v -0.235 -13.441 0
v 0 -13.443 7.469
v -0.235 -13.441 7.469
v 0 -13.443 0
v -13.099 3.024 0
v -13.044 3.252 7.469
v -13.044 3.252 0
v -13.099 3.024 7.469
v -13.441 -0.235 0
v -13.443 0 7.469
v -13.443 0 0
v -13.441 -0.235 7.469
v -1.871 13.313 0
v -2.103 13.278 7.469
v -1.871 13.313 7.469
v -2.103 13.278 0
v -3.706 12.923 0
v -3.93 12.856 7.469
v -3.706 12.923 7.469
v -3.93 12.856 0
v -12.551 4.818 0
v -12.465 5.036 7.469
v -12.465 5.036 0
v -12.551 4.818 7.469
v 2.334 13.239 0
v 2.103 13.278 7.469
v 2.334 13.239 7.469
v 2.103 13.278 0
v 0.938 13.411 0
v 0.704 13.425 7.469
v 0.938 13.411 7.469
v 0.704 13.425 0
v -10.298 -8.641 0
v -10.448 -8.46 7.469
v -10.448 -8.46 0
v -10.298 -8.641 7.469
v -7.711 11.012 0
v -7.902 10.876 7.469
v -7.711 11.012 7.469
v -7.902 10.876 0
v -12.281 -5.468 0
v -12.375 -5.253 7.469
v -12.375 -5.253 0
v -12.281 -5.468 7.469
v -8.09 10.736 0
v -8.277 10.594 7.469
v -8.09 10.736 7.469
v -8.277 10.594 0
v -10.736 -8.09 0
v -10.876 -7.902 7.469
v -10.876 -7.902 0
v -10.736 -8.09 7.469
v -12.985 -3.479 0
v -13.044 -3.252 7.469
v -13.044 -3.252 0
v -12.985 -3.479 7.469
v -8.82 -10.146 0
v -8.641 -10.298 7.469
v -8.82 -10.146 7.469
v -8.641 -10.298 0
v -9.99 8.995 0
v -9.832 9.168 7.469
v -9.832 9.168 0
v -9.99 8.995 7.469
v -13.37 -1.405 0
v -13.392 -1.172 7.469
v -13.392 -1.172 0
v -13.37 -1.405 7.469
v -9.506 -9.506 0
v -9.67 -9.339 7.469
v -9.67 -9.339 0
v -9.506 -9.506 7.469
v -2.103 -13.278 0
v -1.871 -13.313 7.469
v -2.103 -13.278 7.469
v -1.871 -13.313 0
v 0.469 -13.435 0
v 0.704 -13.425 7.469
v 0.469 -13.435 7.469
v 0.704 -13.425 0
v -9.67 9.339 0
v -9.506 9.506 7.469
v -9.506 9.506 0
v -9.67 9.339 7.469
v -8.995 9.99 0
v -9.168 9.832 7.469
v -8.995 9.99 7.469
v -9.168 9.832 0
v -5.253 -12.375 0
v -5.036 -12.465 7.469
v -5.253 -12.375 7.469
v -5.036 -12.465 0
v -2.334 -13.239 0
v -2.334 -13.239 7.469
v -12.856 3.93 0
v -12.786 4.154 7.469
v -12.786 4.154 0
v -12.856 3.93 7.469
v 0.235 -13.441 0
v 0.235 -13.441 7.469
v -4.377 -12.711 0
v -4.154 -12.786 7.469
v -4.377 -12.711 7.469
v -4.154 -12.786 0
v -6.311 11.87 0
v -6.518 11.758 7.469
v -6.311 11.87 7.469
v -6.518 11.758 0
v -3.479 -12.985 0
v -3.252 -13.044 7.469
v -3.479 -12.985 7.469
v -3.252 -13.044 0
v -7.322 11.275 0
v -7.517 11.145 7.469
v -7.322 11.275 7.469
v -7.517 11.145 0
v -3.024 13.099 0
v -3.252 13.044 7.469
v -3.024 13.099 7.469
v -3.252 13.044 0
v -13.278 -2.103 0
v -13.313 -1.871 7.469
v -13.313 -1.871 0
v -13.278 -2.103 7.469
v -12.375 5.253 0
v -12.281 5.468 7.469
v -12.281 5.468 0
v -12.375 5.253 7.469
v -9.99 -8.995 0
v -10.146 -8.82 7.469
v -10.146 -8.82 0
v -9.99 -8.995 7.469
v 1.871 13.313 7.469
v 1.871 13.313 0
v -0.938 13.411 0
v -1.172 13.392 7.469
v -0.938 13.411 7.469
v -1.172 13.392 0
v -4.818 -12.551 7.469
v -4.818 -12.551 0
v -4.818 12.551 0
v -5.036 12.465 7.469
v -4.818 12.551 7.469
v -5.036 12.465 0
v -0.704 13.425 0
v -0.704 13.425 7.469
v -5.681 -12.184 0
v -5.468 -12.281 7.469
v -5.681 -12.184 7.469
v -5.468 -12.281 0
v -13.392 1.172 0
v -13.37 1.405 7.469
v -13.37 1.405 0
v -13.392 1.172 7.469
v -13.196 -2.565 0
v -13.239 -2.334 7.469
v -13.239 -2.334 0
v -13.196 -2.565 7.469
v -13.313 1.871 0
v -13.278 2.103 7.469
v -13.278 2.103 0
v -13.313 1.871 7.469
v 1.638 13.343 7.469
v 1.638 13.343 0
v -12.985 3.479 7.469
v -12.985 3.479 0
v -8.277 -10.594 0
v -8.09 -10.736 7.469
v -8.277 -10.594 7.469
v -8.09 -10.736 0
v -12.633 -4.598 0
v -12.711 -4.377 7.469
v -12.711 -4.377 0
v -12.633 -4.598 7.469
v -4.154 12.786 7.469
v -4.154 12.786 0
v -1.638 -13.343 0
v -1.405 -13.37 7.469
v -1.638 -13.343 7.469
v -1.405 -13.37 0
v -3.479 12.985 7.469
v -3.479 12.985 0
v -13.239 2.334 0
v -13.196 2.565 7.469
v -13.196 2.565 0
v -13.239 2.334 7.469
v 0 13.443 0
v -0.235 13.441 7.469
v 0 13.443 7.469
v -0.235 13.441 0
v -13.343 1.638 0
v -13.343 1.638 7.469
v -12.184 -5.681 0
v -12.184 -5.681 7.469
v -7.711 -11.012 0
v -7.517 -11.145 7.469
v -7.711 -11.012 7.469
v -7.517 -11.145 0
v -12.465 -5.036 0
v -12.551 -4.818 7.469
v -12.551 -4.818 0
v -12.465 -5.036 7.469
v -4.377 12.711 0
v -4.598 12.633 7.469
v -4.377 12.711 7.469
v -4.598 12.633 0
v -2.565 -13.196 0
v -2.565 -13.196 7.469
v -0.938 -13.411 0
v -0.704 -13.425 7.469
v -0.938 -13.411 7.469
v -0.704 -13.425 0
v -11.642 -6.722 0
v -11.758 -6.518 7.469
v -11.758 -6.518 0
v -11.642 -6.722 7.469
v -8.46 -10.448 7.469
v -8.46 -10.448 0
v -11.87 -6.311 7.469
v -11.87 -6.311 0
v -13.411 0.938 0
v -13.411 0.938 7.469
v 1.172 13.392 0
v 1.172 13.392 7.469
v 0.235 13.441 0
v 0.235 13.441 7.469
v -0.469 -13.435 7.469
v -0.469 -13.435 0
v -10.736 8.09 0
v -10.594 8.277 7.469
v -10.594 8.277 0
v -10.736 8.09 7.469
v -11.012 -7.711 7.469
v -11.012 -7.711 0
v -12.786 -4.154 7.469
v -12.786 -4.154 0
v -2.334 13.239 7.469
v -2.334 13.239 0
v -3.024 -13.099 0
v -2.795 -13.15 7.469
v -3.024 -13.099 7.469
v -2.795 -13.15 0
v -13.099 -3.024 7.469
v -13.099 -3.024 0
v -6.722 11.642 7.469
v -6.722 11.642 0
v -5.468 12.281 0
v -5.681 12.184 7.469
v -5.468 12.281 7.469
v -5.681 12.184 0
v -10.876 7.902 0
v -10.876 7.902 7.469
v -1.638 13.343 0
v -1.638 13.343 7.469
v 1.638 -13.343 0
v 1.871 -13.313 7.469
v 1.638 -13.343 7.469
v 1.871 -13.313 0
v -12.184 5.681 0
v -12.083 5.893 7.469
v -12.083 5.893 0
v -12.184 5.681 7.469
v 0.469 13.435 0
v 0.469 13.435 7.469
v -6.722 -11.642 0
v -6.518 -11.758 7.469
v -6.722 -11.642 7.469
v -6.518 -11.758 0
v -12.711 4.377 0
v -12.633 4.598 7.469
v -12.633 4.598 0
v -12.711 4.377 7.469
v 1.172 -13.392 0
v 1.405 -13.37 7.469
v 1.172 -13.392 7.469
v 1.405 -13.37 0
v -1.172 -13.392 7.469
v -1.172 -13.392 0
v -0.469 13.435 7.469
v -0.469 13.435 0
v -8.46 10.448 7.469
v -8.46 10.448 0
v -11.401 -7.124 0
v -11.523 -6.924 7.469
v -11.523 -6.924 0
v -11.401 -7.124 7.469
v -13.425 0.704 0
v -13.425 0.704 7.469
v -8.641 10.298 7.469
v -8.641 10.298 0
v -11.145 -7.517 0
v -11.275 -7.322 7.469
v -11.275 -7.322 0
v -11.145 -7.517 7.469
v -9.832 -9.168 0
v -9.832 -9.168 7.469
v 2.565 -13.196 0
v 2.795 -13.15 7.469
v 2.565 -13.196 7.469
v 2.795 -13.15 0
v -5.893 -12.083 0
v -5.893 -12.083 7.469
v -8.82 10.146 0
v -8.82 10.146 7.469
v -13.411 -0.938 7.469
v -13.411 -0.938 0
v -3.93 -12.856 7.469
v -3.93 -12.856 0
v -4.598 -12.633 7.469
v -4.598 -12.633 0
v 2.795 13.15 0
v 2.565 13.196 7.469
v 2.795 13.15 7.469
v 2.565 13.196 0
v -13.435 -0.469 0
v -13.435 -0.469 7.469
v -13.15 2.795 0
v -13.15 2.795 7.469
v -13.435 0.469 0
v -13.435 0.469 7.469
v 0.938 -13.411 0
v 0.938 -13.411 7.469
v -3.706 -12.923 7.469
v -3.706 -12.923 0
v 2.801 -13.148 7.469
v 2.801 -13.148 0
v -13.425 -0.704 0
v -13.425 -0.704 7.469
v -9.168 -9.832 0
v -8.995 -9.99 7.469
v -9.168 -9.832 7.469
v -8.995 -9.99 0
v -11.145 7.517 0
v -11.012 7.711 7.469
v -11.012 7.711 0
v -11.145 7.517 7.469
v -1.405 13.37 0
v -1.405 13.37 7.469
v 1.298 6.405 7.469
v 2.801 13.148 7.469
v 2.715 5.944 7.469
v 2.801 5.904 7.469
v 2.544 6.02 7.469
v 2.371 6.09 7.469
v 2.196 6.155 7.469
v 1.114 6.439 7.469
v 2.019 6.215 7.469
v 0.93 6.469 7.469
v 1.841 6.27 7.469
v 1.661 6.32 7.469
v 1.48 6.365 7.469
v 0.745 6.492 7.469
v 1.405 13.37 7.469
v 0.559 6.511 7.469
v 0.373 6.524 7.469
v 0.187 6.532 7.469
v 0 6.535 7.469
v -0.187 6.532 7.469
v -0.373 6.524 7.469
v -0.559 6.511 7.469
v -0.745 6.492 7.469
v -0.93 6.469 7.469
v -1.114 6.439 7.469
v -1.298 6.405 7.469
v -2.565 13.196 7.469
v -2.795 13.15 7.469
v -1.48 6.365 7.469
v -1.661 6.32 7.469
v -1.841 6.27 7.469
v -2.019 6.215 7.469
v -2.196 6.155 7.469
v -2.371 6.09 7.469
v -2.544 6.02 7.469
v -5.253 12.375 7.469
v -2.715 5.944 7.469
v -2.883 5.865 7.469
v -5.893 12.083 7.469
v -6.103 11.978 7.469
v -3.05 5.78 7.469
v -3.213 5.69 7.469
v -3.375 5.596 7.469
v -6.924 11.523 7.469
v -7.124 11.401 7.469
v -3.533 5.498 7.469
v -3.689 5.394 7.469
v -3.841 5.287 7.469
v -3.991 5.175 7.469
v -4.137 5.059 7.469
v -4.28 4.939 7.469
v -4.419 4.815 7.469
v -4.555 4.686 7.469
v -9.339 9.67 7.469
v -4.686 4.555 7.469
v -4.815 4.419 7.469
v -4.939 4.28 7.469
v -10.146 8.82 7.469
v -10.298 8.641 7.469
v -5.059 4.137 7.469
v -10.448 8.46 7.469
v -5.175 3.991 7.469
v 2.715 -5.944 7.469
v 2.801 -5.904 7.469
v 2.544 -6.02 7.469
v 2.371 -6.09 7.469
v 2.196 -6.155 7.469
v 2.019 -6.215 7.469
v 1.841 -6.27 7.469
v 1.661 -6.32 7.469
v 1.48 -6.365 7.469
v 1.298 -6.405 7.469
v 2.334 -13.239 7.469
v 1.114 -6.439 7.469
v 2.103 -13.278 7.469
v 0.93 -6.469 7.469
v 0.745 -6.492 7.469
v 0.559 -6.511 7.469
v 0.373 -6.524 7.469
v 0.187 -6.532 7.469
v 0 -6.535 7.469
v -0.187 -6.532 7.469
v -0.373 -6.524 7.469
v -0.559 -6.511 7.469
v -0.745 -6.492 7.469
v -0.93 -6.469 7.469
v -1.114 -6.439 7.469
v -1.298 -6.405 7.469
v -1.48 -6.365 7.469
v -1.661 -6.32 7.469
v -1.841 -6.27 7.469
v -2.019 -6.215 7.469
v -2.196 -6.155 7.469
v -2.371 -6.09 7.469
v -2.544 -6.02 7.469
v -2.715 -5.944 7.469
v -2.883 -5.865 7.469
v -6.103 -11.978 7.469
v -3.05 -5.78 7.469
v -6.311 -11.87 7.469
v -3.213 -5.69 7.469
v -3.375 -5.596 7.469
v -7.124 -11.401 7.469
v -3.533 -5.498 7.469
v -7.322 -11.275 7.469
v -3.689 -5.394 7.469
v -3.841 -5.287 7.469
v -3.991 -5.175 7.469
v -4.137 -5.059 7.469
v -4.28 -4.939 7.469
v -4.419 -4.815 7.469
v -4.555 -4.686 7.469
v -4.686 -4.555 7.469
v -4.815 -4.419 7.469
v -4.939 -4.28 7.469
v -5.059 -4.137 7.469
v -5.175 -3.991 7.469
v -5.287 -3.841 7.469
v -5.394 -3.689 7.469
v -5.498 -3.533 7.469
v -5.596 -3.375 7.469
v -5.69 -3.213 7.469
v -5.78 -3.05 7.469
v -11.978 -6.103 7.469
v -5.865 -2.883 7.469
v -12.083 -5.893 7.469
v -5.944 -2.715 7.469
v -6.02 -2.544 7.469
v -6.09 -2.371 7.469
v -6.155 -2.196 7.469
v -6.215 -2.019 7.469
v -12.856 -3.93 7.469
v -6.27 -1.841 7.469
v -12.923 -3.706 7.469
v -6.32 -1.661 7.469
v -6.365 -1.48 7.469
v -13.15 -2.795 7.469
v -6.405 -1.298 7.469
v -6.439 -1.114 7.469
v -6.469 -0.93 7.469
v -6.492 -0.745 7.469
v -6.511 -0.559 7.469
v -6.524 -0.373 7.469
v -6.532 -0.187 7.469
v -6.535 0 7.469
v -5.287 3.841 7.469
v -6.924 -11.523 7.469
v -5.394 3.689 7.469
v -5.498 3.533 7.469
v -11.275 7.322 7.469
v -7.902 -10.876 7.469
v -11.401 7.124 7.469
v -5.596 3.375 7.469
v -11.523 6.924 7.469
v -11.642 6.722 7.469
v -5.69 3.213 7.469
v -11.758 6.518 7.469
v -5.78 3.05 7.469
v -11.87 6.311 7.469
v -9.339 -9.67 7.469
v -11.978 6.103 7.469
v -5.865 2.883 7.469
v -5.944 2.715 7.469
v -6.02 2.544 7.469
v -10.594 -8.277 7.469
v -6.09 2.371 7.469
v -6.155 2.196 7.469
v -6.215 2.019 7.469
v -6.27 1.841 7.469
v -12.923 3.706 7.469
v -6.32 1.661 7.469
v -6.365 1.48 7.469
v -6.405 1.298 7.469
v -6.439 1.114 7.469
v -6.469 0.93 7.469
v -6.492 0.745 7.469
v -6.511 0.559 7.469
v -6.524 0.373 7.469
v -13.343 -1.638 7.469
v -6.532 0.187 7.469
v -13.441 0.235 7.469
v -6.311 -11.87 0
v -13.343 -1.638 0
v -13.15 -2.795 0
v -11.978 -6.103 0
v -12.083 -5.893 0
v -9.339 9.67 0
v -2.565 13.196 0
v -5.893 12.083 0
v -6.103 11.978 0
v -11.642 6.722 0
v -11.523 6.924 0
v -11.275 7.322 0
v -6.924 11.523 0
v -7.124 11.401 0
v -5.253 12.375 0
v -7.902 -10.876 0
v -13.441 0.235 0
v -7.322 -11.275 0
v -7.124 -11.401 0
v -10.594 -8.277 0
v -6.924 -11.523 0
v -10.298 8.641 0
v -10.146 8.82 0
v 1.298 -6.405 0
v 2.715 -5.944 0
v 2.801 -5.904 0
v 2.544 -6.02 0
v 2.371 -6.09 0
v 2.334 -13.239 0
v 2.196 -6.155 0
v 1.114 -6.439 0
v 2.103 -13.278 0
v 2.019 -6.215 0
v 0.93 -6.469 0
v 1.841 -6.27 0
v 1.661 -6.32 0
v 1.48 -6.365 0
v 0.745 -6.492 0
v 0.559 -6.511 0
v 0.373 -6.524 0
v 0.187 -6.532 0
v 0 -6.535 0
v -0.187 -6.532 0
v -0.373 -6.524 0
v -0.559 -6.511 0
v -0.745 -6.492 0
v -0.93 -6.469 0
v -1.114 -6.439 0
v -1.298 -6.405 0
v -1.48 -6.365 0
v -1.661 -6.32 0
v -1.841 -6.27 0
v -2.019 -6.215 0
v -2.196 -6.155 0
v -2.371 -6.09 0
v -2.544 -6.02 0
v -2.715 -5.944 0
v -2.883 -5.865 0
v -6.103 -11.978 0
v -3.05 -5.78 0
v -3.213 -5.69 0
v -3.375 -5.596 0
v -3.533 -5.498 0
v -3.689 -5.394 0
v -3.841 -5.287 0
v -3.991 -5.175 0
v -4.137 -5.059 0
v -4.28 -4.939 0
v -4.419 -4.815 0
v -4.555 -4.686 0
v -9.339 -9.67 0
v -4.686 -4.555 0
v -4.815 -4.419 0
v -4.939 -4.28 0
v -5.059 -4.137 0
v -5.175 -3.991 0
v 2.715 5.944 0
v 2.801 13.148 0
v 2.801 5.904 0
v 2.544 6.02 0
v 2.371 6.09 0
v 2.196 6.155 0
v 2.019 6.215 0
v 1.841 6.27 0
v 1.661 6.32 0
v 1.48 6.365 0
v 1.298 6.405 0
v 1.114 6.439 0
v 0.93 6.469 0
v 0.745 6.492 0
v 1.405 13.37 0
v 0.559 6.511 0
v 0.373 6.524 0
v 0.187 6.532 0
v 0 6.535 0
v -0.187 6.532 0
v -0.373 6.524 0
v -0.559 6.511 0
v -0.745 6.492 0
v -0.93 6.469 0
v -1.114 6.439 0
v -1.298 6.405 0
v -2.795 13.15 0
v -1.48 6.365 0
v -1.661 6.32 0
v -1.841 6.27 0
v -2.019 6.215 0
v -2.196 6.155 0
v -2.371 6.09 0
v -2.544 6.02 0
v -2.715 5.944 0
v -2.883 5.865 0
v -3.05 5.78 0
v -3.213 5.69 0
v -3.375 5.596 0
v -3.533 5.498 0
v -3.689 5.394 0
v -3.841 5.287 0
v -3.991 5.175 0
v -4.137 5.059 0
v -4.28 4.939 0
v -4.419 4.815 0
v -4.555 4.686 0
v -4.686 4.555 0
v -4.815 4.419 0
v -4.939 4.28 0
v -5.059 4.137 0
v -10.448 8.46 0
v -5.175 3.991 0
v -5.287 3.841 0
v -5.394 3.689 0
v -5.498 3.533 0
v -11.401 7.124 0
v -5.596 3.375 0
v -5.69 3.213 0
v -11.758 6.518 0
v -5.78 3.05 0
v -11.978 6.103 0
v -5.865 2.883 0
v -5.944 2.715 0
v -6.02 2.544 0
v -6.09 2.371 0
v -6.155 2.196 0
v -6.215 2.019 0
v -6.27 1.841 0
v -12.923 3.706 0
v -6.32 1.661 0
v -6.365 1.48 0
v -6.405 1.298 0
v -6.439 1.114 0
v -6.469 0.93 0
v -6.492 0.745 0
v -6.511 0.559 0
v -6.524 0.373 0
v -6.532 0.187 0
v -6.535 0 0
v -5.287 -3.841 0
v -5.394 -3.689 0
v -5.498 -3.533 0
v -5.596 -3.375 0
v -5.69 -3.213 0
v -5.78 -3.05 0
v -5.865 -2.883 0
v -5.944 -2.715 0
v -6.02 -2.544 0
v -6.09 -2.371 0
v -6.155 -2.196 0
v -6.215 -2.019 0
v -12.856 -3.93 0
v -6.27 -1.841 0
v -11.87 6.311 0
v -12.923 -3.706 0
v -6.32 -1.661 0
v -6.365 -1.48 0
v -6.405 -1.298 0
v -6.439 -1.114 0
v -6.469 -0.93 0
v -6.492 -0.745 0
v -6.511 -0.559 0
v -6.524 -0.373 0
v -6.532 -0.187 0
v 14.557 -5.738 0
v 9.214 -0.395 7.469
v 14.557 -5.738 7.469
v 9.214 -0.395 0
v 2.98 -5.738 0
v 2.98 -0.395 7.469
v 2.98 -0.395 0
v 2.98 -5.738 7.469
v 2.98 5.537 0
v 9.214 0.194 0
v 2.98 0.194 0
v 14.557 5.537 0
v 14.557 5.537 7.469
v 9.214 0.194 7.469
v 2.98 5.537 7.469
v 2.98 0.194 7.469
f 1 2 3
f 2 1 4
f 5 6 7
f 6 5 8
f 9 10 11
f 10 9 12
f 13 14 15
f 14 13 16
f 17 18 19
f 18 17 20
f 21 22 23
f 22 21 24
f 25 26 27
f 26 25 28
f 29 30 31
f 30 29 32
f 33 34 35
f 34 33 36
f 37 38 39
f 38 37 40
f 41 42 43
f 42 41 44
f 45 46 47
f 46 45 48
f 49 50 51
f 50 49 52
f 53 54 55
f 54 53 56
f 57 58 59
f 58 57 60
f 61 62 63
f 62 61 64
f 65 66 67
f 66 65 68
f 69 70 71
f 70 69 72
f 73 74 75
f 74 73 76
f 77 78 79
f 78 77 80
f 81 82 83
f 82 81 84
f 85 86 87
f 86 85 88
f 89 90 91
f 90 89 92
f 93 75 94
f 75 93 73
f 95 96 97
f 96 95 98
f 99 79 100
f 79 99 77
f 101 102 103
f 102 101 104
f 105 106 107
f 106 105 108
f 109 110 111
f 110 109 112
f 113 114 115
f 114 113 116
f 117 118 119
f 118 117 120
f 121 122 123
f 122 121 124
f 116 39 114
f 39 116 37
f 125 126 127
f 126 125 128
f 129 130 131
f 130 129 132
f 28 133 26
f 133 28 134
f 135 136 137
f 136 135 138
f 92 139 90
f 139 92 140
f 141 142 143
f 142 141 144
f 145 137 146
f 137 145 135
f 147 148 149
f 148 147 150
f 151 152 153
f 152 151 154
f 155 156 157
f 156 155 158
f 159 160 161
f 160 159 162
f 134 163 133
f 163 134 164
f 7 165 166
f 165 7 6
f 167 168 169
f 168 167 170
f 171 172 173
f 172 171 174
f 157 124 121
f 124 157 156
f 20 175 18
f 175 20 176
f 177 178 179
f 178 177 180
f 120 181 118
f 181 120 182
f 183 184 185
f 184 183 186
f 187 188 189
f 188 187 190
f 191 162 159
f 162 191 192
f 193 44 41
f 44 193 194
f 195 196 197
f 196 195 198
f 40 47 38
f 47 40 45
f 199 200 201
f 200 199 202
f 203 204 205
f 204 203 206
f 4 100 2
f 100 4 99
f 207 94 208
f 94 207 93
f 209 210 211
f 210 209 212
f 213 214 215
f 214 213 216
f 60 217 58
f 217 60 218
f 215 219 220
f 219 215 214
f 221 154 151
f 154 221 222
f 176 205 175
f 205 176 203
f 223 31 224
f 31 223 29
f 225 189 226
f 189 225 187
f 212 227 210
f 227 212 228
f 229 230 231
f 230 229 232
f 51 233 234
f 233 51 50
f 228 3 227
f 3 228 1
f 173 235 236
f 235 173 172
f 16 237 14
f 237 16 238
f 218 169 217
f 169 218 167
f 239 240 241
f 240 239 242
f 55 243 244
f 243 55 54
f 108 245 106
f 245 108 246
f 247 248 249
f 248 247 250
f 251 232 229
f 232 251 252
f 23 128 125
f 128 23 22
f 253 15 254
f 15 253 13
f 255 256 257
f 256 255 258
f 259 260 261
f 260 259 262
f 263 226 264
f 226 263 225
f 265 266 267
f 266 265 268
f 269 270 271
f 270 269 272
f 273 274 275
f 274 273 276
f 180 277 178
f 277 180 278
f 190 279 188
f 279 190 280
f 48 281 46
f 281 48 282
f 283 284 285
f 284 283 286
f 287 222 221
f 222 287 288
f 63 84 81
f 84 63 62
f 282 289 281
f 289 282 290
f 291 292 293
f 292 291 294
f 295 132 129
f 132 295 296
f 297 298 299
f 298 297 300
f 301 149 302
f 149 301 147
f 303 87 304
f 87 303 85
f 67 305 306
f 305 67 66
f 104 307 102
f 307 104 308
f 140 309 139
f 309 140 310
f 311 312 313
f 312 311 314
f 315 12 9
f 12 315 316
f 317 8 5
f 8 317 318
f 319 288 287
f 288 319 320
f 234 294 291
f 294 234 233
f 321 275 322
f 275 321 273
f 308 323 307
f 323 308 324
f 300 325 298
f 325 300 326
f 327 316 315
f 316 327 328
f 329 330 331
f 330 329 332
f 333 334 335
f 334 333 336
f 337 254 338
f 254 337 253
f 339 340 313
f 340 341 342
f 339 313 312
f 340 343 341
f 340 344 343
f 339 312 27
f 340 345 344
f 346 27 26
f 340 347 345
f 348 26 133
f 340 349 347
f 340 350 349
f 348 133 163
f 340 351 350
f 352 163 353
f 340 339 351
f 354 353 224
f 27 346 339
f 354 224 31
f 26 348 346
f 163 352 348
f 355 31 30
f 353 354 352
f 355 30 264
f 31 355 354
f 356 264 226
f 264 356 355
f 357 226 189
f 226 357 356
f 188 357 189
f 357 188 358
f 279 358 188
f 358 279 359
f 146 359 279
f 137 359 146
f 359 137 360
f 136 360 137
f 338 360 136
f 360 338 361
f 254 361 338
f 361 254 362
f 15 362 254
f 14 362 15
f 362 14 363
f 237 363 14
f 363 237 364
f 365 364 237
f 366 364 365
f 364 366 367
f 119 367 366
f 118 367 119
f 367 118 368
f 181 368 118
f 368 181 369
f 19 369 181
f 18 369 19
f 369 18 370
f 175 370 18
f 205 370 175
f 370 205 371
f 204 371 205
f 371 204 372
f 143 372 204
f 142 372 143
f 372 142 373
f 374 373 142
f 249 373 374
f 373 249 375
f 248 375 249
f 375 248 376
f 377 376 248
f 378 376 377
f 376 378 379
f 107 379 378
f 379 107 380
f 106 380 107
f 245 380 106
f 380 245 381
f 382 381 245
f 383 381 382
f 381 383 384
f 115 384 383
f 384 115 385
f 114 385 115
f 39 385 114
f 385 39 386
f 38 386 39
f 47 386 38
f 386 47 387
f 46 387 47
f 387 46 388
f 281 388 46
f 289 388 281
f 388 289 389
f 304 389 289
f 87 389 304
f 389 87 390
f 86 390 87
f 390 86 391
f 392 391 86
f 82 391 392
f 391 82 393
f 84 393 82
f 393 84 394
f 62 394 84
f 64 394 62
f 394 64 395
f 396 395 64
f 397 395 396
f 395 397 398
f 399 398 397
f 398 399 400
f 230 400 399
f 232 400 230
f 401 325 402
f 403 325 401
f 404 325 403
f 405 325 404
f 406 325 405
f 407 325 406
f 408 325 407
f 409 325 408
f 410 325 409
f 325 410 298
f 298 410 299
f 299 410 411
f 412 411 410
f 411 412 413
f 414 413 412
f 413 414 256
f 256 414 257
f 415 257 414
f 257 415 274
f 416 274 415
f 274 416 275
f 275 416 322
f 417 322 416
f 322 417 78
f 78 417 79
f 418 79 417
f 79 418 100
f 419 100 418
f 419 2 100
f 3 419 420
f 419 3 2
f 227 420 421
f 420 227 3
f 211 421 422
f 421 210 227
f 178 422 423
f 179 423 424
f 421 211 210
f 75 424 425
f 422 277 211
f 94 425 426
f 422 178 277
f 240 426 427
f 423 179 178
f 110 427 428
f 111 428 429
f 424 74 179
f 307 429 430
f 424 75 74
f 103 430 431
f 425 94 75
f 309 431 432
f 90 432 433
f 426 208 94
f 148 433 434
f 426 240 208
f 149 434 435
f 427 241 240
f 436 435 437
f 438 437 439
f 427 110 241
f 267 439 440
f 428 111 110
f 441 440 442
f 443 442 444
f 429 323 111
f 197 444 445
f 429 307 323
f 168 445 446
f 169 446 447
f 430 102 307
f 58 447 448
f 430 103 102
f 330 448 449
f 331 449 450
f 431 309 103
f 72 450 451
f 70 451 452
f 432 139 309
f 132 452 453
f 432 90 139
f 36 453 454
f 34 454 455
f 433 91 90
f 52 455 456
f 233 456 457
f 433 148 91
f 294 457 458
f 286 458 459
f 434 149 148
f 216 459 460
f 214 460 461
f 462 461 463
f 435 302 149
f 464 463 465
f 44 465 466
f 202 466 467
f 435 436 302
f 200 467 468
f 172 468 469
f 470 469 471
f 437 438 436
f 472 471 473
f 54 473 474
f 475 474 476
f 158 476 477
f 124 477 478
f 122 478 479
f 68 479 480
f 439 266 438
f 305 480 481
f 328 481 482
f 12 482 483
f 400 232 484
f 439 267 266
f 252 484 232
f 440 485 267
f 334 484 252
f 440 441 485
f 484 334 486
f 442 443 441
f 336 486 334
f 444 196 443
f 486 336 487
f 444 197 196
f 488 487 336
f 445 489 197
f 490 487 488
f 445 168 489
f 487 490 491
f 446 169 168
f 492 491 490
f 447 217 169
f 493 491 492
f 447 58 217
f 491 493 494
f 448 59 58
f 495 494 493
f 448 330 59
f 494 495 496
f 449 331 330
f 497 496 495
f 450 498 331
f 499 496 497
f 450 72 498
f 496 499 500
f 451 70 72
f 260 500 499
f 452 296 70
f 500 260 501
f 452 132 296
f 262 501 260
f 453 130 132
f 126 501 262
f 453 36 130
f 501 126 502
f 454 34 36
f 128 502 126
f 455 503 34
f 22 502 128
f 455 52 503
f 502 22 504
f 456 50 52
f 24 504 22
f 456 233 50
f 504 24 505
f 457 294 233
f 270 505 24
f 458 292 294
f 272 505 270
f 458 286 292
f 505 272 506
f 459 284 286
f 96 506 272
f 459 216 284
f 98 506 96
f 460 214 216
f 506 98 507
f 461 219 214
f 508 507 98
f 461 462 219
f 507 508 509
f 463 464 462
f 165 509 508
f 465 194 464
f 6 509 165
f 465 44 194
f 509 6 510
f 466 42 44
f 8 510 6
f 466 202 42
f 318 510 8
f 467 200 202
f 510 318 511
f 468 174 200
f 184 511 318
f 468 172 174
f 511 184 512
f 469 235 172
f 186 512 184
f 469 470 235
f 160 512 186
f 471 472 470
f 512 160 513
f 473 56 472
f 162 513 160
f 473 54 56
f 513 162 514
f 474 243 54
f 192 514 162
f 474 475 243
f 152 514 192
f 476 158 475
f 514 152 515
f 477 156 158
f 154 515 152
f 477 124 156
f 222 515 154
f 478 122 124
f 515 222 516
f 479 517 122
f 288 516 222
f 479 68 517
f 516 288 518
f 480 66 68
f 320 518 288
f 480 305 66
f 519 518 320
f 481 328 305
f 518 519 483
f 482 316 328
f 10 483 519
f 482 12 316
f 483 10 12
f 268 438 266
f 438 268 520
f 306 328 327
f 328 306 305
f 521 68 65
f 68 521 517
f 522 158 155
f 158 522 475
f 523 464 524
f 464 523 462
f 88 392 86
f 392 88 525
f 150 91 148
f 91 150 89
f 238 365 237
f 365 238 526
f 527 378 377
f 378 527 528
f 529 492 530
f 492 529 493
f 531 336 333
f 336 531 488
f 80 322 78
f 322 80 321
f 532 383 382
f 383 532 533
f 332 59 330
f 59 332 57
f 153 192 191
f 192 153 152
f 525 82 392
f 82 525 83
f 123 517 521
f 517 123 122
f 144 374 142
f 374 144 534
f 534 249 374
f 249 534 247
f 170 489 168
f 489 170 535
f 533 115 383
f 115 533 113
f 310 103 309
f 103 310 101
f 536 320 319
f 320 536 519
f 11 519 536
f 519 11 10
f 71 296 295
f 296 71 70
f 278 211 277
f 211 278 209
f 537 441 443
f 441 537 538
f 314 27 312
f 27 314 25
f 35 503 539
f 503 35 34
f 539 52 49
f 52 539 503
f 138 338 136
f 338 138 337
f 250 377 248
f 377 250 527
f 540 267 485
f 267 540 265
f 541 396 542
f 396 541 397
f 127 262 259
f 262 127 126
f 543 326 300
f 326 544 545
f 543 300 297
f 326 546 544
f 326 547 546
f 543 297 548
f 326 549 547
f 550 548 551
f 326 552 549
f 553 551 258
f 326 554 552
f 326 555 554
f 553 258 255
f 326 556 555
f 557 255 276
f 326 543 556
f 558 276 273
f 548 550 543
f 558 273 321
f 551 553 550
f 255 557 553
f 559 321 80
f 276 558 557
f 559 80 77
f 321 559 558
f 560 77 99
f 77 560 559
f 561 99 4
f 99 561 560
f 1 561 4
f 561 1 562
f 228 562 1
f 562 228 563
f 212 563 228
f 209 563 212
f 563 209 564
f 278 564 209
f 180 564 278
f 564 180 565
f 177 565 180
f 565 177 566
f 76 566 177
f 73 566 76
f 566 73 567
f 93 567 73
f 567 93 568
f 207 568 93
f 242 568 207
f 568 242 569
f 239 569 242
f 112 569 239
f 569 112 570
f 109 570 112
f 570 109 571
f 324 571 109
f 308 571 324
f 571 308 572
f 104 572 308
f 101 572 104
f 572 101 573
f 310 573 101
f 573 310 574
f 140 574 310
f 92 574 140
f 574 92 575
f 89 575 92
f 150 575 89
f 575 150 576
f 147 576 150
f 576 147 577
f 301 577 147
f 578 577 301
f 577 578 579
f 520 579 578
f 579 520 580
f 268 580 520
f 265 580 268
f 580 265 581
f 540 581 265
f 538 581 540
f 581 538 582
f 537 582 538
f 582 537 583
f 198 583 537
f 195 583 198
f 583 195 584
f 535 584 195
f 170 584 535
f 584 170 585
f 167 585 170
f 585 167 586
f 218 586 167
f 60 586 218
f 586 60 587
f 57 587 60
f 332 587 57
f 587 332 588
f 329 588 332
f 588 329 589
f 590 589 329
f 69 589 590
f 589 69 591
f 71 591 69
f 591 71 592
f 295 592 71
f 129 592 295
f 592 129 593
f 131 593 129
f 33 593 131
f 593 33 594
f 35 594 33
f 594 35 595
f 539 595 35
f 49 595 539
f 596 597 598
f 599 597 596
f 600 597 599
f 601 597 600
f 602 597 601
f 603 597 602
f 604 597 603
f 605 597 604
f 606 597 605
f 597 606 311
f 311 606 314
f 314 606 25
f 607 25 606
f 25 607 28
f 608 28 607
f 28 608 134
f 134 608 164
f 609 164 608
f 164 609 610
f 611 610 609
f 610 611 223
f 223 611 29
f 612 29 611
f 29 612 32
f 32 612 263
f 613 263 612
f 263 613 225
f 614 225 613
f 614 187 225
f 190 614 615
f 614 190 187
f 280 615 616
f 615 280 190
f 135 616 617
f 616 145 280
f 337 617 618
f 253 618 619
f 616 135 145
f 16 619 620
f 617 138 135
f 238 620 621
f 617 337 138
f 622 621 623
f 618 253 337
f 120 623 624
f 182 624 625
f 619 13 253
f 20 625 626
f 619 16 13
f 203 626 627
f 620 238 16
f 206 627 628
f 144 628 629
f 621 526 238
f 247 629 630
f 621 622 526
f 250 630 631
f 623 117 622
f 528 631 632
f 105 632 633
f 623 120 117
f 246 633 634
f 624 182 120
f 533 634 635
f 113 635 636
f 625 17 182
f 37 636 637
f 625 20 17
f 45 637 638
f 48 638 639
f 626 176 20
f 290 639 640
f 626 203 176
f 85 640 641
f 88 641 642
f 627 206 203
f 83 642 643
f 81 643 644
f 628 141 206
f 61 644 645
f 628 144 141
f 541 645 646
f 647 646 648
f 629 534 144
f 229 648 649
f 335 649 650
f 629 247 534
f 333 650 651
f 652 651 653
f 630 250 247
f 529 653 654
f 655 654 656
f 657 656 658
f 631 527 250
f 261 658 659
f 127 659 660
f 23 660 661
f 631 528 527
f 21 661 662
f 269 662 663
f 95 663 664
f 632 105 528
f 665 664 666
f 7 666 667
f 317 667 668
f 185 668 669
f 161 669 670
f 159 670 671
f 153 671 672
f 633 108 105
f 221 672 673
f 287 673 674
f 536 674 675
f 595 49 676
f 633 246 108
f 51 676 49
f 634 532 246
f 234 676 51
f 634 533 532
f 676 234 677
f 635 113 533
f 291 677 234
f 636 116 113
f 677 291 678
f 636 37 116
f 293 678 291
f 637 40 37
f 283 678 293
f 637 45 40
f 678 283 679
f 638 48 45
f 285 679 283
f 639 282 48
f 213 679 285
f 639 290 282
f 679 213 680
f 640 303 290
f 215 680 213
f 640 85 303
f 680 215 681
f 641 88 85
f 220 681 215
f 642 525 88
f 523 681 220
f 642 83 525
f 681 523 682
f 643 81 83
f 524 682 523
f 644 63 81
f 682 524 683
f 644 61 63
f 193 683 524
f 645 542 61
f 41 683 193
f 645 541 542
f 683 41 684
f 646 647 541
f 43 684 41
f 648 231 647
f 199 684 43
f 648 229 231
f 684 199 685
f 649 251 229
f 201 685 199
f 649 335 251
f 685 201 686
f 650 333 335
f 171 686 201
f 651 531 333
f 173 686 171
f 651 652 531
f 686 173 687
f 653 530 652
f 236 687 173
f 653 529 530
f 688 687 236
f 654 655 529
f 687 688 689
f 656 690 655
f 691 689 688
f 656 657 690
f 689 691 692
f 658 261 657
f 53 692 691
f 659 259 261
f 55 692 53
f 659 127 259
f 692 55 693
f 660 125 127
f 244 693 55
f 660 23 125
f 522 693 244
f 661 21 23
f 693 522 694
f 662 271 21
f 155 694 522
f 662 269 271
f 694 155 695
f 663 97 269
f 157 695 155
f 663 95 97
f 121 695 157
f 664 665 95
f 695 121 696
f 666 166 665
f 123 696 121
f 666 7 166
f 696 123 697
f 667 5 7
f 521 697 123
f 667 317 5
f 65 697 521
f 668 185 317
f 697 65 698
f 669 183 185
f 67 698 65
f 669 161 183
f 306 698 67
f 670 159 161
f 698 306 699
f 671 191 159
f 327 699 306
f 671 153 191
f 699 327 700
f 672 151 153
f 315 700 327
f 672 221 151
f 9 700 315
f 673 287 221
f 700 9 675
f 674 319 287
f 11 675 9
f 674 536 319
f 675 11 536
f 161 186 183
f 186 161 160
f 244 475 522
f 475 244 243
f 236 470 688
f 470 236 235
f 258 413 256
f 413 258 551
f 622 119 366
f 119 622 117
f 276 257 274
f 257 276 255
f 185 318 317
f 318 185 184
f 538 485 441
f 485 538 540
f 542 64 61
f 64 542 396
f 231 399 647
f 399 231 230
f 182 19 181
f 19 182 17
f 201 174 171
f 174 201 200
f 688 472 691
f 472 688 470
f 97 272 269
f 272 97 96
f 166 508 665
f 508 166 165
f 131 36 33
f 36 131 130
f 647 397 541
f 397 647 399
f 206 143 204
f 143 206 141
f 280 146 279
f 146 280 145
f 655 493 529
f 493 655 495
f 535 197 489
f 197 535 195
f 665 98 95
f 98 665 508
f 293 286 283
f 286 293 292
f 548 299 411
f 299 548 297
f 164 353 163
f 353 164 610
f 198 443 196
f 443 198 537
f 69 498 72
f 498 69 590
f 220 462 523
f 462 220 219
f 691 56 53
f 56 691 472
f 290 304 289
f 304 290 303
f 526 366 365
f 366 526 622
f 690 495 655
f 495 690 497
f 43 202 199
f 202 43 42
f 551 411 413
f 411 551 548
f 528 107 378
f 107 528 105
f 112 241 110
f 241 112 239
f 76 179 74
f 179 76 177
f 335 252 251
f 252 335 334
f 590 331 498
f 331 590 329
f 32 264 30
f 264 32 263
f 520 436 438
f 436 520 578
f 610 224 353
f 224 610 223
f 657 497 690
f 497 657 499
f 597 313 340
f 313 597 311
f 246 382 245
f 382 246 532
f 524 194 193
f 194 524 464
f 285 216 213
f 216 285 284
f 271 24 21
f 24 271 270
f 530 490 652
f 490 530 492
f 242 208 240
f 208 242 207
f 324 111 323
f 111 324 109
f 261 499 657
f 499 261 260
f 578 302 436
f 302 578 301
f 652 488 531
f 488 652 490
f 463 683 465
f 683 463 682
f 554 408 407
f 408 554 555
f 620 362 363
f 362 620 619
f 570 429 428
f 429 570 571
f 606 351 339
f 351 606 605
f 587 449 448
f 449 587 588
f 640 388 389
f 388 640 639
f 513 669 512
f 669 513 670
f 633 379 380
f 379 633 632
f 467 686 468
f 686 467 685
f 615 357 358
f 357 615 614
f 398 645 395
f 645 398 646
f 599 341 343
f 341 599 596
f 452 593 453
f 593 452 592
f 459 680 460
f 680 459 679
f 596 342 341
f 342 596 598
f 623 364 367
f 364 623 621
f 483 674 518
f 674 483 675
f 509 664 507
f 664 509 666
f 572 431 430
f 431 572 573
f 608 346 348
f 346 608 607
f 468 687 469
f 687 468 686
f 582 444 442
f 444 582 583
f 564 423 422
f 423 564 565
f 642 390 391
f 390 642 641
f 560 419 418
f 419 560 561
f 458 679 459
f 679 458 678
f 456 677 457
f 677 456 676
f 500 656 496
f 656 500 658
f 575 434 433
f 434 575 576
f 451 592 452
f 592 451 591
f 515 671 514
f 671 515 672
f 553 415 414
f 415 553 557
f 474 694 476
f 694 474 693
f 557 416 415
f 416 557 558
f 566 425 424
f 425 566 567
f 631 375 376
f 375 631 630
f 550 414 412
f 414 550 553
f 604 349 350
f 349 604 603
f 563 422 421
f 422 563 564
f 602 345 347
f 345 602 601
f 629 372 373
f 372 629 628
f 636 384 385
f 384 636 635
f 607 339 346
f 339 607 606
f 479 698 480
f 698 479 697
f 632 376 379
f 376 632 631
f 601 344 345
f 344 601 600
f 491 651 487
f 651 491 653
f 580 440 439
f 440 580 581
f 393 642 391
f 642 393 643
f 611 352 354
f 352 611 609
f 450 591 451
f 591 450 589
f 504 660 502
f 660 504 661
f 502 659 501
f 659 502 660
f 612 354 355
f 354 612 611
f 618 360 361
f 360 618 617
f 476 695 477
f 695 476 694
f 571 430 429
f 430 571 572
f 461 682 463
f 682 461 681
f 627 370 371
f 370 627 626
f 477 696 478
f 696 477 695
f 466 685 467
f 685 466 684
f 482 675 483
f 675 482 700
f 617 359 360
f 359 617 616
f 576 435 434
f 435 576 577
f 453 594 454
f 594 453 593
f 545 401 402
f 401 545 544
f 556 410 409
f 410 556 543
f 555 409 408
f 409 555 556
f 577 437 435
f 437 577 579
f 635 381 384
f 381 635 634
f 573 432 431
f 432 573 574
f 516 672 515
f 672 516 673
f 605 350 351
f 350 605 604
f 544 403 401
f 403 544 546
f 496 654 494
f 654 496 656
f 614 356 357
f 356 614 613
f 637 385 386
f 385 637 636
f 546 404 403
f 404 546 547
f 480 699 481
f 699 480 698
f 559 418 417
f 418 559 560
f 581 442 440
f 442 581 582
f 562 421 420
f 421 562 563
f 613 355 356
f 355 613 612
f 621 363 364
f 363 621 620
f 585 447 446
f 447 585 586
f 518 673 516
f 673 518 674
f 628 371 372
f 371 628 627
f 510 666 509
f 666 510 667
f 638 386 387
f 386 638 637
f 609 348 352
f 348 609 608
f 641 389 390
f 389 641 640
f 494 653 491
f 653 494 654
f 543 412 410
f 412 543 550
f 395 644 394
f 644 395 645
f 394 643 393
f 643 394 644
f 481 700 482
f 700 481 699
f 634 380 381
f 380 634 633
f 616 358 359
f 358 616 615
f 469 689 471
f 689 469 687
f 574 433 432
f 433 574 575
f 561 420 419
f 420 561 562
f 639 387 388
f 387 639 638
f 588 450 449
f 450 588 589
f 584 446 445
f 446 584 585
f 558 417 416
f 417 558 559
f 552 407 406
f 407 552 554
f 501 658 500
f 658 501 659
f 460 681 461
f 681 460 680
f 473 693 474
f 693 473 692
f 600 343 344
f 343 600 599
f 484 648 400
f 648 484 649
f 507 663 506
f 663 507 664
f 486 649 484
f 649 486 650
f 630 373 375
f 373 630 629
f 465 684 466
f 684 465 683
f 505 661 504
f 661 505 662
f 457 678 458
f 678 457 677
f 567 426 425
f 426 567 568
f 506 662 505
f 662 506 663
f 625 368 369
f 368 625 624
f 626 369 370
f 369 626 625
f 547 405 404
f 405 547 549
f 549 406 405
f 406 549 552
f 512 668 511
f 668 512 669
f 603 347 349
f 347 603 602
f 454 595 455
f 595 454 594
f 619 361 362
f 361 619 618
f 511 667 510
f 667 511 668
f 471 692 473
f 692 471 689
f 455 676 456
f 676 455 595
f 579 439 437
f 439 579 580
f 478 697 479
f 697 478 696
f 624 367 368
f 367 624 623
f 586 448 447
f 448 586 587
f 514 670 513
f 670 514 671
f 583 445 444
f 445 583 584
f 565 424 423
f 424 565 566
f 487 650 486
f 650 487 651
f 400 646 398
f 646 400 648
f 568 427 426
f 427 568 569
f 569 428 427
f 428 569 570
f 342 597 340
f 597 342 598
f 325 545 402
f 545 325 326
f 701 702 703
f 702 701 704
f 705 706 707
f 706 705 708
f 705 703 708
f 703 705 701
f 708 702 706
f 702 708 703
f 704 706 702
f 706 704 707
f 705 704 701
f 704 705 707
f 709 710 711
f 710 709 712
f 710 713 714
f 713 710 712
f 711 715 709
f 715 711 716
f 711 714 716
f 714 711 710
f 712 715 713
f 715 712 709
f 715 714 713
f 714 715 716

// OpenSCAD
$fa=1;
$fs=0.1;

module CommodoreLogo() {
    translate( [-8.3,-8.2,2]) linear_extrude(height = 4, center = true, convexity = 10)  resize([6.2],true) polygon([[8.3,4.3],[8.3,6.7], [11.1,6.7], [13.5,4.3]]);
    translate( [-8.3,-8.6,2]) linear_extrude(height = 4, center = true, convexity = 10)  resize([6.2],true) polygon([[8.3,9.7],[8.3,7.3], [11.1,7.3], [13.5,9.7]]);

    difference() {
        translate( [0,0,0] ) cylinder(h=4,r=7.2);
        translate( [0,0,-1] ) cylinder(h=7,r=3.5);
        translate( [11.5,0,4] )cube(20, center = true);
    }
}

resize([28], auto = true) CommodoreLogo();
